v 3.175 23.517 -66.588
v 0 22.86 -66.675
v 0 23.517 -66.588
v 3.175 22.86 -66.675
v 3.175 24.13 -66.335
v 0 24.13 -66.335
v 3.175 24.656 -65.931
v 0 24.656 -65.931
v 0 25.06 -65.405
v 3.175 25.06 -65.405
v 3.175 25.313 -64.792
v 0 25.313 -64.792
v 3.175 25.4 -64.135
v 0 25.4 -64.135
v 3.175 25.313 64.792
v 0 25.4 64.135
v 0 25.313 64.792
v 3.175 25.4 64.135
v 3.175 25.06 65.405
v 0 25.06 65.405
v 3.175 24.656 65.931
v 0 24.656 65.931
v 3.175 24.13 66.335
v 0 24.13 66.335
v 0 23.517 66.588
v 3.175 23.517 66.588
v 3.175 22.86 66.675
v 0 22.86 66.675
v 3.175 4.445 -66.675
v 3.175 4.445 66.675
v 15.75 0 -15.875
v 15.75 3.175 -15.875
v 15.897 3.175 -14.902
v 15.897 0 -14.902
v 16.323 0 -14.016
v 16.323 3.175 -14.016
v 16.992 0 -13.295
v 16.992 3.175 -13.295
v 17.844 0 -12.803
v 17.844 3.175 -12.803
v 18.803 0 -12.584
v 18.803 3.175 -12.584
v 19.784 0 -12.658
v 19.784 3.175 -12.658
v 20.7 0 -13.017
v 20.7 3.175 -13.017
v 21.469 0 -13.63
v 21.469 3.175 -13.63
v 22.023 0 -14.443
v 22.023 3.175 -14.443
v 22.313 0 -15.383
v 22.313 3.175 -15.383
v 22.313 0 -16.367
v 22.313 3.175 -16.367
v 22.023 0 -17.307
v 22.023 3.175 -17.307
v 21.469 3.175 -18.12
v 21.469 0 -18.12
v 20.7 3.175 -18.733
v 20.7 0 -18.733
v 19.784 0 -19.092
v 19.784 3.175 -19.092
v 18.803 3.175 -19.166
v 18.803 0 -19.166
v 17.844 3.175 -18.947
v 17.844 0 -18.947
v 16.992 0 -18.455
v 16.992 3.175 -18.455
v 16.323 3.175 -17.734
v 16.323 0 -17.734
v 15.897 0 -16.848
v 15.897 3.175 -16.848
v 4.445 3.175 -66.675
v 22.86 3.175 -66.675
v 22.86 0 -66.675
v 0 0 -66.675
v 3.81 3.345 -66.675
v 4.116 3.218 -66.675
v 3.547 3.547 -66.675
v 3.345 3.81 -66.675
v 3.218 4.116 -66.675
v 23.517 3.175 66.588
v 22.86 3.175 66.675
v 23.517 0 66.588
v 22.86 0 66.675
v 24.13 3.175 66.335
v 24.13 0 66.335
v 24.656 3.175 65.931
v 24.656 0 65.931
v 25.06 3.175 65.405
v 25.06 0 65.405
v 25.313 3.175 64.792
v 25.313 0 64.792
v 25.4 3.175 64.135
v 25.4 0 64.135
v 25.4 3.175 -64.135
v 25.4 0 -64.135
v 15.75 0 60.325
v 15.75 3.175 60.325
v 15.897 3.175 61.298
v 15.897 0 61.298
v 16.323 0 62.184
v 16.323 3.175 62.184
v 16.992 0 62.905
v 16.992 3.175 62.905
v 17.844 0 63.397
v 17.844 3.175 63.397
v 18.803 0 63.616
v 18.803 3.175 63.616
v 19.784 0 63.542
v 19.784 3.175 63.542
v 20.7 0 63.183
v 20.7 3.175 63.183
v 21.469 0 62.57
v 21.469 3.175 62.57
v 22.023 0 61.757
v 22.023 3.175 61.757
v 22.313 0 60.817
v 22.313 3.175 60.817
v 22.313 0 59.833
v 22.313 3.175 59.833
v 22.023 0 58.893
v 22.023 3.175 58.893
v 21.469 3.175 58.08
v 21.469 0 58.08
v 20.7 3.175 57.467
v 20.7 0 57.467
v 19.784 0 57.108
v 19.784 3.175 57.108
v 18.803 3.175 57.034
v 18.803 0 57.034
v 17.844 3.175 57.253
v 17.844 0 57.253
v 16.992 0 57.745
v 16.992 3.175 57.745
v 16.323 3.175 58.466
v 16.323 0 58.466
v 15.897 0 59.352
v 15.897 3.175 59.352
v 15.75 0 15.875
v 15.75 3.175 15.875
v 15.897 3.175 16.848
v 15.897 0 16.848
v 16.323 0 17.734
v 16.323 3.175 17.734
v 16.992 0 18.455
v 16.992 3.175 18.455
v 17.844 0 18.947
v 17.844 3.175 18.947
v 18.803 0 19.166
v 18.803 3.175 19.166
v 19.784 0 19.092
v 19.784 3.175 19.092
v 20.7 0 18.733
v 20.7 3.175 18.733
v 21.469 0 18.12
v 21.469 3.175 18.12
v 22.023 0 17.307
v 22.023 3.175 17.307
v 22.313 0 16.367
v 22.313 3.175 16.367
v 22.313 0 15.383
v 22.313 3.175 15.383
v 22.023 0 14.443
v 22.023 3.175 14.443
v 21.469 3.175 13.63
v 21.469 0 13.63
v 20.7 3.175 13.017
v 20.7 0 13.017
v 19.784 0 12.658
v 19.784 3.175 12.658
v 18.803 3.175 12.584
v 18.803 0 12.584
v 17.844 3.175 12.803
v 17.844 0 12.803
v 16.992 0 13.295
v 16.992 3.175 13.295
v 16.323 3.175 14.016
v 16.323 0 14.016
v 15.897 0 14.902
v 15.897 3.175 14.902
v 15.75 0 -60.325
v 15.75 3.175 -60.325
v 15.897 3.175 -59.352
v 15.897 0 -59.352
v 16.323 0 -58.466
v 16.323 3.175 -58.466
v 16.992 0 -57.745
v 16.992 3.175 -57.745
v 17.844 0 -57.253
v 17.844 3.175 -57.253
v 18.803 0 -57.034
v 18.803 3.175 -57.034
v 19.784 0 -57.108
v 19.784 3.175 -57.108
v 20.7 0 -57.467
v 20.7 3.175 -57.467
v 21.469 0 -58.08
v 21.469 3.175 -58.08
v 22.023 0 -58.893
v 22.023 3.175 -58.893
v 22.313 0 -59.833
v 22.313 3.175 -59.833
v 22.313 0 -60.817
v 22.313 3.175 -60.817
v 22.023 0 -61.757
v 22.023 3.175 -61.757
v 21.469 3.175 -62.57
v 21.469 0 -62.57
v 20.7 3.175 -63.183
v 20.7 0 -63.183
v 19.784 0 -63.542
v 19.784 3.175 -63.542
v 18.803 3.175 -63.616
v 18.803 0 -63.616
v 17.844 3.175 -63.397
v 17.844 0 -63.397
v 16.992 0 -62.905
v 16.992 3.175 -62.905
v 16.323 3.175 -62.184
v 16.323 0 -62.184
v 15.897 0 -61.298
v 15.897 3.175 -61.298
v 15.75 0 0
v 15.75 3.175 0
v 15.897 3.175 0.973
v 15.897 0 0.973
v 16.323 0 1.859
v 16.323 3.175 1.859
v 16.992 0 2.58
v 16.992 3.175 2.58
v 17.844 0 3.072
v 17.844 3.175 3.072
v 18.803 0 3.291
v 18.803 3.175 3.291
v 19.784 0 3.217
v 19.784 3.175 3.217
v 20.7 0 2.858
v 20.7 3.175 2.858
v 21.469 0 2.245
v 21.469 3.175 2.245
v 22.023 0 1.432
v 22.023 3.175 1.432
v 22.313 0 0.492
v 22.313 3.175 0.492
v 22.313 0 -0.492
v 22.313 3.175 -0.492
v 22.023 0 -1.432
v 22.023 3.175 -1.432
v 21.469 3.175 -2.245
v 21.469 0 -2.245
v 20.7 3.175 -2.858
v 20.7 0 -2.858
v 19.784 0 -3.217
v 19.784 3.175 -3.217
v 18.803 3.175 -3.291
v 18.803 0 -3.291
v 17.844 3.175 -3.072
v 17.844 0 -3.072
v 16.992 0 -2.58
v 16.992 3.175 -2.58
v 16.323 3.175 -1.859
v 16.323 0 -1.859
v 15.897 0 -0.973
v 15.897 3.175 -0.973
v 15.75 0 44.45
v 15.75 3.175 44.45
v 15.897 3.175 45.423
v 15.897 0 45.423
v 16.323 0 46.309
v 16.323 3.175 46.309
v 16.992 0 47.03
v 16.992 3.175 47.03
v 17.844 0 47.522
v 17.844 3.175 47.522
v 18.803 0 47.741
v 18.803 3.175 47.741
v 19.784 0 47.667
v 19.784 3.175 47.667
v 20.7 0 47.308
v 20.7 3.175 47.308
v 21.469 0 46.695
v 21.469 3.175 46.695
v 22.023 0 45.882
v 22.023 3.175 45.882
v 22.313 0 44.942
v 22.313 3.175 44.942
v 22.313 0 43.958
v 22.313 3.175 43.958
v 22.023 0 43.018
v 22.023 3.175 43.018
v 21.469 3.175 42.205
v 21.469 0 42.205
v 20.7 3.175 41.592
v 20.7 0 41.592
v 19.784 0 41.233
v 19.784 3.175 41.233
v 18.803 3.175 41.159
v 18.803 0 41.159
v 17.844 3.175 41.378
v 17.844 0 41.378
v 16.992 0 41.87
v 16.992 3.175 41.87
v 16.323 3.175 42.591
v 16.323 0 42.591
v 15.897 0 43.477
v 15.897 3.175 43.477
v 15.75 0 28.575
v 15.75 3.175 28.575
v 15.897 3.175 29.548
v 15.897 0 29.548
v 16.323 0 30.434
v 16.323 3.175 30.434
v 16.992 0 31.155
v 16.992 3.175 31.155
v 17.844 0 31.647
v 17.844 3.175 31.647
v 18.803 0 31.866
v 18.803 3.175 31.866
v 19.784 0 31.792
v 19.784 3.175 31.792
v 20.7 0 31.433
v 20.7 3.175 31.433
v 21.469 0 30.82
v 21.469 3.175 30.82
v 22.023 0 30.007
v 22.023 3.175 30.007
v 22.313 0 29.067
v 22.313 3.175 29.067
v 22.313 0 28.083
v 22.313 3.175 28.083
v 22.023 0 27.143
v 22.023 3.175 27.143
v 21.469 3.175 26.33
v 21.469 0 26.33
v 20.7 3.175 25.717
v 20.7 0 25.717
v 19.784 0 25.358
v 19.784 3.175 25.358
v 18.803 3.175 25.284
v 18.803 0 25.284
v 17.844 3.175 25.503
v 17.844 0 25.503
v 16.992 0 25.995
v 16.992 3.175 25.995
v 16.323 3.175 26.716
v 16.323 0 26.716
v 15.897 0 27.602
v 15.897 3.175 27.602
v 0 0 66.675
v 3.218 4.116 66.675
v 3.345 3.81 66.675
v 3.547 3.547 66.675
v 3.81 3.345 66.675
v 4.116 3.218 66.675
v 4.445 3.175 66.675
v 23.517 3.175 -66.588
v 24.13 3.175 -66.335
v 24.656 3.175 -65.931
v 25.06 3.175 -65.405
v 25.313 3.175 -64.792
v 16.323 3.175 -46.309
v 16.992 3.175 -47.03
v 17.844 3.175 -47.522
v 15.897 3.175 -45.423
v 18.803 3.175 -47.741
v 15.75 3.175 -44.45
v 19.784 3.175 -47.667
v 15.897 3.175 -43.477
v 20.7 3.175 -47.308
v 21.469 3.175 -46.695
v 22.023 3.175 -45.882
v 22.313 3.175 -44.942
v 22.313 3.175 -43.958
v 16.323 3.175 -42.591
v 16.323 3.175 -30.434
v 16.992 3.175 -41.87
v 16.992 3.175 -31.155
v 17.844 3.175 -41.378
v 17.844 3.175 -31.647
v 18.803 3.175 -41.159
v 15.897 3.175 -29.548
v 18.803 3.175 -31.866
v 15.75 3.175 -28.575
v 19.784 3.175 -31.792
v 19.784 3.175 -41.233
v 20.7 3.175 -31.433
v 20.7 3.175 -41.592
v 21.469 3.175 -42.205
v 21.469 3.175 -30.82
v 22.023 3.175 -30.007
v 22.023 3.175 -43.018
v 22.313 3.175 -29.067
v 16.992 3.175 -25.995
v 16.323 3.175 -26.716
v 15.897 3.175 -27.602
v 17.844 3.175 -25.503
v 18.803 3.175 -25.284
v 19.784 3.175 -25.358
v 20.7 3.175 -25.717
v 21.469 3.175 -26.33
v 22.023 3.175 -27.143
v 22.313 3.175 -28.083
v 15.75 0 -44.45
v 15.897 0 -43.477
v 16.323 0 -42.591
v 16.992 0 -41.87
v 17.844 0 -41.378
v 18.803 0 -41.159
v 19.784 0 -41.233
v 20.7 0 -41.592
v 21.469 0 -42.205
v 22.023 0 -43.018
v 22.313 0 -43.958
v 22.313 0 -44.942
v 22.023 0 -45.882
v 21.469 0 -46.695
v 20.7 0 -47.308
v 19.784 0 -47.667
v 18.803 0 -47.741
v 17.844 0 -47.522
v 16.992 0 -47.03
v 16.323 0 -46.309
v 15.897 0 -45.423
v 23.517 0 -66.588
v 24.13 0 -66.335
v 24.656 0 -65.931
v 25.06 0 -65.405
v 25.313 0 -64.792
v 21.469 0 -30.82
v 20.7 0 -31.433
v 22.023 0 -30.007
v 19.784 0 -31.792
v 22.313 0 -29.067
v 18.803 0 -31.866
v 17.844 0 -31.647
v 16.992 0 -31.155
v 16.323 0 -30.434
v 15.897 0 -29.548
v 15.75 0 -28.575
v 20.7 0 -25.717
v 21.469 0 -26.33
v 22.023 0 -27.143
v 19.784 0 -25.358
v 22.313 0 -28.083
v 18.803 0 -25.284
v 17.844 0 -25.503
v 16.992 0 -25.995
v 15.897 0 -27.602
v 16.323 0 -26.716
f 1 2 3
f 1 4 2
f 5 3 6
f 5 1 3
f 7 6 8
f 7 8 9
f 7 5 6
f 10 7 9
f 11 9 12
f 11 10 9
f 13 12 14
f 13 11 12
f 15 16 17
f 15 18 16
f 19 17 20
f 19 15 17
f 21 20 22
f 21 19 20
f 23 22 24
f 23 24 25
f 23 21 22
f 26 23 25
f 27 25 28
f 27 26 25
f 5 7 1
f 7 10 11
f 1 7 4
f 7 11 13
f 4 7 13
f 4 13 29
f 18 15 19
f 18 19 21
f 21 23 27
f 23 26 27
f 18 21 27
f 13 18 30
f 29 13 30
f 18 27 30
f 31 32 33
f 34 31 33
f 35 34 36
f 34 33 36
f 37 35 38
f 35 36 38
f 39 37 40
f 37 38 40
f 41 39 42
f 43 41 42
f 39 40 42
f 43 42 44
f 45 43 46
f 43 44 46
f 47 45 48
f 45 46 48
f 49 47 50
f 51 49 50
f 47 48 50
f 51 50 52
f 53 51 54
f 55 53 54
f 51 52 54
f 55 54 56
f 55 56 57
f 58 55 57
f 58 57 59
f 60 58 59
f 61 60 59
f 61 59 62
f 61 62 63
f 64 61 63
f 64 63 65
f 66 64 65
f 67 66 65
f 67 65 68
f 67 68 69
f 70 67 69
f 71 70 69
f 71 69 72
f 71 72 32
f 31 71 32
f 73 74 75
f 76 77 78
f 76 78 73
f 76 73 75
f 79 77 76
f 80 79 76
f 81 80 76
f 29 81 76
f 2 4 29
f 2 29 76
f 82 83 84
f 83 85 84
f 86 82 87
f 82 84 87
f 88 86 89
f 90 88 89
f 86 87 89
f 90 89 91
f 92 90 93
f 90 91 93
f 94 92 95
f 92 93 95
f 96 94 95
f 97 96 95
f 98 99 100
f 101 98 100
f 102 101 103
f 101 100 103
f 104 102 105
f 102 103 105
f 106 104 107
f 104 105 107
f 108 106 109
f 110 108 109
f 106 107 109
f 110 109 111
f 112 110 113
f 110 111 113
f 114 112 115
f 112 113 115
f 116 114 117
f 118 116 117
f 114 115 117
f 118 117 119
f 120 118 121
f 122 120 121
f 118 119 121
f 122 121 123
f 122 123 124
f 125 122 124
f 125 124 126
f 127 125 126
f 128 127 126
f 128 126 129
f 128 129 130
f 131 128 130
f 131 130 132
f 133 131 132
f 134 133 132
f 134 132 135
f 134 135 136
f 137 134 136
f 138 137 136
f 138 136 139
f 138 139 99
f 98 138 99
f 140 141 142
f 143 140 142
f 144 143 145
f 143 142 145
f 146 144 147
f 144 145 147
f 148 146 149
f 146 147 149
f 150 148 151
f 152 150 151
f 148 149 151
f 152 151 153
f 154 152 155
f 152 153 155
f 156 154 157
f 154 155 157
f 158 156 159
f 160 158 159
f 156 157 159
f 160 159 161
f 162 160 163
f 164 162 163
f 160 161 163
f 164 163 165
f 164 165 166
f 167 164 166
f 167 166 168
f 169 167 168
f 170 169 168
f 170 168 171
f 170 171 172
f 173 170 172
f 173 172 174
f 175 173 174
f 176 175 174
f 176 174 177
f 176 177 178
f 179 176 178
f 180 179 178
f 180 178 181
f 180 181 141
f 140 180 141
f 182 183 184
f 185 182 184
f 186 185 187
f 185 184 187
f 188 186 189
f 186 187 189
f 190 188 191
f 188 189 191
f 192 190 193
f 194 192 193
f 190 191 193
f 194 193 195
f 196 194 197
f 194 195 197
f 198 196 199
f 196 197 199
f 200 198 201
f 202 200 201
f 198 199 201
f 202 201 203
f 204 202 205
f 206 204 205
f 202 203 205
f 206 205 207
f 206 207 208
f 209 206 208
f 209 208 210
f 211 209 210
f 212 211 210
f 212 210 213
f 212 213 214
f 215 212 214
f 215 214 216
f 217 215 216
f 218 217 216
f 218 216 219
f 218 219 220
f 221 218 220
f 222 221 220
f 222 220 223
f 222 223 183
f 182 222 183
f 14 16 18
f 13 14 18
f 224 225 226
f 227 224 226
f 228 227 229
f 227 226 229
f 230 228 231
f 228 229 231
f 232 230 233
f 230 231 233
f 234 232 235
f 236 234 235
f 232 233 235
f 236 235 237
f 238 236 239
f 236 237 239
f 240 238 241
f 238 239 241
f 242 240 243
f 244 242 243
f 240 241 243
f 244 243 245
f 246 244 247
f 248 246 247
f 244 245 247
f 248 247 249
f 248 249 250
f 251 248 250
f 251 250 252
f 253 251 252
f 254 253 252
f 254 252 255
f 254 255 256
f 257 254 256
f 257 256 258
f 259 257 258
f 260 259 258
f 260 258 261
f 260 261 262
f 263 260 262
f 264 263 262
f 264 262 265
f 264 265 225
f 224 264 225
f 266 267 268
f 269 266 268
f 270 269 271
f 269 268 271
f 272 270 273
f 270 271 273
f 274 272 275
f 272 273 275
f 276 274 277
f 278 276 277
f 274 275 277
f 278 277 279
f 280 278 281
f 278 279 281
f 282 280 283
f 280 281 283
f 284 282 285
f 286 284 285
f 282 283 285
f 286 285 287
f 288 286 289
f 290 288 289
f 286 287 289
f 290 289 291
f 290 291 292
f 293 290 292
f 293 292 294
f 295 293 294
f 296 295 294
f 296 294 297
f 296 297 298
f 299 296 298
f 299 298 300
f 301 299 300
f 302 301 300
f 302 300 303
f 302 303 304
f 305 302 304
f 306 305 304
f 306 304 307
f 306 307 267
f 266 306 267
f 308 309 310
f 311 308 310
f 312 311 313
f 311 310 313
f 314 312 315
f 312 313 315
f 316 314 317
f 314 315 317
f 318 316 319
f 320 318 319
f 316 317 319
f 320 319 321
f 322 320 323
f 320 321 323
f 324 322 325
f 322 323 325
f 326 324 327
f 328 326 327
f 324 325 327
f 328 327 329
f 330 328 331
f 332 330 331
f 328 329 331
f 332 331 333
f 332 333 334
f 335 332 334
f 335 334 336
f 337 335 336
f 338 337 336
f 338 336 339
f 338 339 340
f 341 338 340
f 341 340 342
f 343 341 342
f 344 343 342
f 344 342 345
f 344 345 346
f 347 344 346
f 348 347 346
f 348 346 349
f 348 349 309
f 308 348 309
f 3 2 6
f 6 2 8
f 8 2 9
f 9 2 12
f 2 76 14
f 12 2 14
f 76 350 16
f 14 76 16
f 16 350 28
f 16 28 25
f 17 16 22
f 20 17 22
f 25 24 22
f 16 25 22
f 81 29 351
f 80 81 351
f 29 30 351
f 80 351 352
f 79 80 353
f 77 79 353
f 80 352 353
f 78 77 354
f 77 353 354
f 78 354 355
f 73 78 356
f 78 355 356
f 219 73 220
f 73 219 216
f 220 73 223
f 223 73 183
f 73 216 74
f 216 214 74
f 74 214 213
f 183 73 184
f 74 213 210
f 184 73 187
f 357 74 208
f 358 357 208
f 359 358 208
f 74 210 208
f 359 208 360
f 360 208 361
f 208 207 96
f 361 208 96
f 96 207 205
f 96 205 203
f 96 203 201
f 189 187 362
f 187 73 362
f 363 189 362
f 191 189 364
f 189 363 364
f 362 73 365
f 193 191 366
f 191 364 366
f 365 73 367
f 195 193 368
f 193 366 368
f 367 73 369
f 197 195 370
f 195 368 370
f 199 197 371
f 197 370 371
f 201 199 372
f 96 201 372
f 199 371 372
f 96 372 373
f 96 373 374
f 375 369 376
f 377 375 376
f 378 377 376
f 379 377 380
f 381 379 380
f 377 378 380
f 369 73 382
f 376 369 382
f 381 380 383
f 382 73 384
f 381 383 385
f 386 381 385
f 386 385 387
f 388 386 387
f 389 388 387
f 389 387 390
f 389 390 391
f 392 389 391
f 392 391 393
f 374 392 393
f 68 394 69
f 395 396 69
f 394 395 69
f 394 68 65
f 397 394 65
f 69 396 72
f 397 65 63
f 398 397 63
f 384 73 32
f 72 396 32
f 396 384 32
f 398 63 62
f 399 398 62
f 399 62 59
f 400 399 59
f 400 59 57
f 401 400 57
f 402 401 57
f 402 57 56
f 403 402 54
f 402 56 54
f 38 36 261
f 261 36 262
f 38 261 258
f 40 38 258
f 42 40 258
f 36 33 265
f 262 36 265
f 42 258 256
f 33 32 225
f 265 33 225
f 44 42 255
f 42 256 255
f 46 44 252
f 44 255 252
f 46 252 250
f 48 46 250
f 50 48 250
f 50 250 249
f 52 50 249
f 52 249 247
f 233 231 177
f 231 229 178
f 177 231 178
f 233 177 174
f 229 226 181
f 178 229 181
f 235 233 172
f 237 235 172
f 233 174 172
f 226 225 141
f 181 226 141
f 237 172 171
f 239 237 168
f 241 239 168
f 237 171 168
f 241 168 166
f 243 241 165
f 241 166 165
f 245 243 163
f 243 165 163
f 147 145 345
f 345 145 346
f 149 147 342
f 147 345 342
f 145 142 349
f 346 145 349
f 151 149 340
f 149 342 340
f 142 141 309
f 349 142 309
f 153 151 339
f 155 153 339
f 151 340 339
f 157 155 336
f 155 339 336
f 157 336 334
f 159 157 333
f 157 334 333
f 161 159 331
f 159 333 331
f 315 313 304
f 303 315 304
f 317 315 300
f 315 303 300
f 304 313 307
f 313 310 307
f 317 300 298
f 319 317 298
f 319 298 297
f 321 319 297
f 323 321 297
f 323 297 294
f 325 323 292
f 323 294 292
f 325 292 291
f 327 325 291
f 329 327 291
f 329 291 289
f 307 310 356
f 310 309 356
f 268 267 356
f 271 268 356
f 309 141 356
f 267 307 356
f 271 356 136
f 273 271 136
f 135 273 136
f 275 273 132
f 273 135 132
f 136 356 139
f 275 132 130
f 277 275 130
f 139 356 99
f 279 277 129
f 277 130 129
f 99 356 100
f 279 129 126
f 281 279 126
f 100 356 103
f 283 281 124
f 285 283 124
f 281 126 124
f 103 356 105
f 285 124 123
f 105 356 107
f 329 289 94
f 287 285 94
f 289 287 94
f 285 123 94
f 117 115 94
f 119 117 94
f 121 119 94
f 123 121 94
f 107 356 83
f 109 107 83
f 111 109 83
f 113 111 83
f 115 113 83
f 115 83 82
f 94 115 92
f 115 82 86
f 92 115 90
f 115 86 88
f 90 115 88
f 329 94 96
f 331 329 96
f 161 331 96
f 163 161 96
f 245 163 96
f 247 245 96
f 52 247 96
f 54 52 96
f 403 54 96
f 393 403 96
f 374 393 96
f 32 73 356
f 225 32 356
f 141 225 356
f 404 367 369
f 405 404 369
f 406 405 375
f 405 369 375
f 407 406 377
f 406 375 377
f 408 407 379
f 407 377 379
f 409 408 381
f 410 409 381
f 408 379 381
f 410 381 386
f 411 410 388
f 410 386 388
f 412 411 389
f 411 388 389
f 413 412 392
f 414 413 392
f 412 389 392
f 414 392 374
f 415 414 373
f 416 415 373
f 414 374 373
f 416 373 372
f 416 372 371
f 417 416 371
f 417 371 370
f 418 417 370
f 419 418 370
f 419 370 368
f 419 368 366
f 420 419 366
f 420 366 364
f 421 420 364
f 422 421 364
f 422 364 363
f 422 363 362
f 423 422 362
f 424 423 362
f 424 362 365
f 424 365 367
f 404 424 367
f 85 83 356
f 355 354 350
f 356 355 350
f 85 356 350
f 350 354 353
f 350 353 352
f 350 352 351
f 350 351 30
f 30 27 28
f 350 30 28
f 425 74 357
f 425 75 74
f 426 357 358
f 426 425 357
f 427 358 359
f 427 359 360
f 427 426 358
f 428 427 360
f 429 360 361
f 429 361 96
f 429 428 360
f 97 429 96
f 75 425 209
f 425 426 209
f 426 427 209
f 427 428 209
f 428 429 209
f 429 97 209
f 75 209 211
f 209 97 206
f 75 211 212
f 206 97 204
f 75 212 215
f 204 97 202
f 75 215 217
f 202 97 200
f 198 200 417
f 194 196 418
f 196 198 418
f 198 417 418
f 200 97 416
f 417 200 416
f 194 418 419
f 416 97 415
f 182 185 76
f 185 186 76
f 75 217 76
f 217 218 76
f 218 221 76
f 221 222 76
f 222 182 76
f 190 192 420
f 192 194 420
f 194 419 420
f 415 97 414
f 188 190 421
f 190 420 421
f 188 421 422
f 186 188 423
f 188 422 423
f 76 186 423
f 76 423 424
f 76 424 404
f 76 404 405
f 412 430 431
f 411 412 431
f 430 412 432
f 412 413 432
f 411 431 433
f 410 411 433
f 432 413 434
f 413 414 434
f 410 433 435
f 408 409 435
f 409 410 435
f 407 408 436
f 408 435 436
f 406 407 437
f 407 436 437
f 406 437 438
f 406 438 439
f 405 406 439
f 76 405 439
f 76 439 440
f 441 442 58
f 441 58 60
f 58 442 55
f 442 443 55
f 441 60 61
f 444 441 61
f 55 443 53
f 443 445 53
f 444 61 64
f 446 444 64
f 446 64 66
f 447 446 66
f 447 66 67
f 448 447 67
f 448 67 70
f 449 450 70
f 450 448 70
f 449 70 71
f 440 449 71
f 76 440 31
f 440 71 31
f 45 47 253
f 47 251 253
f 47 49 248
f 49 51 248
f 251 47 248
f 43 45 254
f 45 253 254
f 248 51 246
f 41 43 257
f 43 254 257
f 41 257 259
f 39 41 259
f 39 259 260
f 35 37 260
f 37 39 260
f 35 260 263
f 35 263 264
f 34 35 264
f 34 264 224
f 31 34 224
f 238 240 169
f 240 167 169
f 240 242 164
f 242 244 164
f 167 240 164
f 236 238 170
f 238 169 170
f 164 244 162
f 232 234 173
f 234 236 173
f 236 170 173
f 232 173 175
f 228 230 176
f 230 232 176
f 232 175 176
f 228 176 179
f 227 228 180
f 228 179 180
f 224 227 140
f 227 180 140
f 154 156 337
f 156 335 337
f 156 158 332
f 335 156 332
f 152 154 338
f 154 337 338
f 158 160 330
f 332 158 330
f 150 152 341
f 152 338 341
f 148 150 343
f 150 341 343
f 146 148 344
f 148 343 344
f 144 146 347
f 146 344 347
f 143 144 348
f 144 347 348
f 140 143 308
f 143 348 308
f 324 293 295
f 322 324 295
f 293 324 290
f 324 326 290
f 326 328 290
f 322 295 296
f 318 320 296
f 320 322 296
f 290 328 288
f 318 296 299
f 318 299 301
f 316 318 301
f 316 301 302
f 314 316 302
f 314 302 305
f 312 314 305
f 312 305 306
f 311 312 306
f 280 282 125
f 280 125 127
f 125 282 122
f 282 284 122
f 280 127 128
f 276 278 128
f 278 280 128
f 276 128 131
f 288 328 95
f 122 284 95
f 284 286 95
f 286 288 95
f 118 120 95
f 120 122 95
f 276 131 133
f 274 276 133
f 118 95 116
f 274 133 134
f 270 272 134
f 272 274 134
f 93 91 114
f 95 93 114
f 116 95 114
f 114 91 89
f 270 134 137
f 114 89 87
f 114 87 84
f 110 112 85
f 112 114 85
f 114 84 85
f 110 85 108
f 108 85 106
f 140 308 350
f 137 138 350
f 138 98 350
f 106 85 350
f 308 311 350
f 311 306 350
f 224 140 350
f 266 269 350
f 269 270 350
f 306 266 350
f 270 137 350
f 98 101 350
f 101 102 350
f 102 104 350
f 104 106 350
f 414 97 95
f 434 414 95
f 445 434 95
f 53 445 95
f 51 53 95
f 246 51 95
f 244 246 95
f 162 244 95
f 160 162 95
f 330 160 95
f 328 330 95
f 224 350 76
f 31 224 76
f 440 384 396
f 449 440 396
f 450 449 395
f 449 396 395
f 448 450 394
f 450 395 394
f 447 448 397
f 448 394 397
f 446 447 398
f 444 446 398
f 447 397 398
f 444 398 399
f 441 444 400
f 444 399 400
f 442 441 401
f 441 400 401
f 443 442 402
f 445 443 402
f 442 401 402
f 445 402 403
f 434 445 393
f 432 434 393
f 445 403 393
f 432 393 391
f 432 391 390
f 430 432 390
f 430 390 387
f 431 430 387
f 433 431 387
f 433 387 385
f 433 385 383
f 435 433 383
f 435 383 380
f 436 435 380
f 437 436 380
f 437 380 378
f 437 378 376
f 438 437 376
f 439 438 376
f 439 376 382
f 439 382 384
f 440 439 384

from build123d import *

# Parameters (mm, degrees)
BOSS_EXTRUDE1_DEPTH  = 66.675
M6_CLEARANCE_HOLE3_D = 6.6
LPATTERN1_COUNT      = 3
LPATTERN1_PITCH      = 44.45
FILLET1_R            = 2.54


with BuildPart() as part:
    # Sketch1 → Boss-Extrude1 (new, symmetric)
    with BuildSketch(Plane.XY):
        with BuildLine():
            Line((0, 0), (0, 25.4))
            Line((0, 25.4), (3.175, 25.4))
            Line((3.175, 25.4), (3.175, 4.445))
            ThreePointArc((3.175, 4.445), (3.546974388, 3.546974388), (4.445, 3.175))
            Line((4.445, 3.175), (25.4, 3.175))
            Line((25.4, 3.175), (25.4, 0))
            Line((25.4, 0), (0, 0))
        make_face()
    extrude(amount=BOSS_EXTRUDE1_DEPTH, both=True)

    # M6 Clearance Hole3 (through all)
    with Locations(Plane.XZ):
        with Locations((19.05, 60.325), (19.05, 44.45), (19.05, 28.575)):
            m6_clearance_hole3 = Hole(M6_CLEARANCE_HOLE3_D / 2)

    # LPattern1: M6 Clearance Hole3 ×3
    with Locations(*[(0, 0, -i * LPATTERN1_PITCH) for i in range(1, LPATTERN1_COUNT)]):
        add(m6_clearance_hole3, mode=Mode.SUBTRACT)

    # Fillet1
    fillet1_edges = [part.edges().sort_by_distance(p)[0] for p in [
        (1.5875, 25.4, 66.675),
        (1.5875, 25.4, -66.675),
        (25.4, 1.5875, 66.675),
        (25.4, 1.5875, -66.675),
    ]]
    fillet(fillet1_edges, radius=FILLET1_R)


solid = part.part
